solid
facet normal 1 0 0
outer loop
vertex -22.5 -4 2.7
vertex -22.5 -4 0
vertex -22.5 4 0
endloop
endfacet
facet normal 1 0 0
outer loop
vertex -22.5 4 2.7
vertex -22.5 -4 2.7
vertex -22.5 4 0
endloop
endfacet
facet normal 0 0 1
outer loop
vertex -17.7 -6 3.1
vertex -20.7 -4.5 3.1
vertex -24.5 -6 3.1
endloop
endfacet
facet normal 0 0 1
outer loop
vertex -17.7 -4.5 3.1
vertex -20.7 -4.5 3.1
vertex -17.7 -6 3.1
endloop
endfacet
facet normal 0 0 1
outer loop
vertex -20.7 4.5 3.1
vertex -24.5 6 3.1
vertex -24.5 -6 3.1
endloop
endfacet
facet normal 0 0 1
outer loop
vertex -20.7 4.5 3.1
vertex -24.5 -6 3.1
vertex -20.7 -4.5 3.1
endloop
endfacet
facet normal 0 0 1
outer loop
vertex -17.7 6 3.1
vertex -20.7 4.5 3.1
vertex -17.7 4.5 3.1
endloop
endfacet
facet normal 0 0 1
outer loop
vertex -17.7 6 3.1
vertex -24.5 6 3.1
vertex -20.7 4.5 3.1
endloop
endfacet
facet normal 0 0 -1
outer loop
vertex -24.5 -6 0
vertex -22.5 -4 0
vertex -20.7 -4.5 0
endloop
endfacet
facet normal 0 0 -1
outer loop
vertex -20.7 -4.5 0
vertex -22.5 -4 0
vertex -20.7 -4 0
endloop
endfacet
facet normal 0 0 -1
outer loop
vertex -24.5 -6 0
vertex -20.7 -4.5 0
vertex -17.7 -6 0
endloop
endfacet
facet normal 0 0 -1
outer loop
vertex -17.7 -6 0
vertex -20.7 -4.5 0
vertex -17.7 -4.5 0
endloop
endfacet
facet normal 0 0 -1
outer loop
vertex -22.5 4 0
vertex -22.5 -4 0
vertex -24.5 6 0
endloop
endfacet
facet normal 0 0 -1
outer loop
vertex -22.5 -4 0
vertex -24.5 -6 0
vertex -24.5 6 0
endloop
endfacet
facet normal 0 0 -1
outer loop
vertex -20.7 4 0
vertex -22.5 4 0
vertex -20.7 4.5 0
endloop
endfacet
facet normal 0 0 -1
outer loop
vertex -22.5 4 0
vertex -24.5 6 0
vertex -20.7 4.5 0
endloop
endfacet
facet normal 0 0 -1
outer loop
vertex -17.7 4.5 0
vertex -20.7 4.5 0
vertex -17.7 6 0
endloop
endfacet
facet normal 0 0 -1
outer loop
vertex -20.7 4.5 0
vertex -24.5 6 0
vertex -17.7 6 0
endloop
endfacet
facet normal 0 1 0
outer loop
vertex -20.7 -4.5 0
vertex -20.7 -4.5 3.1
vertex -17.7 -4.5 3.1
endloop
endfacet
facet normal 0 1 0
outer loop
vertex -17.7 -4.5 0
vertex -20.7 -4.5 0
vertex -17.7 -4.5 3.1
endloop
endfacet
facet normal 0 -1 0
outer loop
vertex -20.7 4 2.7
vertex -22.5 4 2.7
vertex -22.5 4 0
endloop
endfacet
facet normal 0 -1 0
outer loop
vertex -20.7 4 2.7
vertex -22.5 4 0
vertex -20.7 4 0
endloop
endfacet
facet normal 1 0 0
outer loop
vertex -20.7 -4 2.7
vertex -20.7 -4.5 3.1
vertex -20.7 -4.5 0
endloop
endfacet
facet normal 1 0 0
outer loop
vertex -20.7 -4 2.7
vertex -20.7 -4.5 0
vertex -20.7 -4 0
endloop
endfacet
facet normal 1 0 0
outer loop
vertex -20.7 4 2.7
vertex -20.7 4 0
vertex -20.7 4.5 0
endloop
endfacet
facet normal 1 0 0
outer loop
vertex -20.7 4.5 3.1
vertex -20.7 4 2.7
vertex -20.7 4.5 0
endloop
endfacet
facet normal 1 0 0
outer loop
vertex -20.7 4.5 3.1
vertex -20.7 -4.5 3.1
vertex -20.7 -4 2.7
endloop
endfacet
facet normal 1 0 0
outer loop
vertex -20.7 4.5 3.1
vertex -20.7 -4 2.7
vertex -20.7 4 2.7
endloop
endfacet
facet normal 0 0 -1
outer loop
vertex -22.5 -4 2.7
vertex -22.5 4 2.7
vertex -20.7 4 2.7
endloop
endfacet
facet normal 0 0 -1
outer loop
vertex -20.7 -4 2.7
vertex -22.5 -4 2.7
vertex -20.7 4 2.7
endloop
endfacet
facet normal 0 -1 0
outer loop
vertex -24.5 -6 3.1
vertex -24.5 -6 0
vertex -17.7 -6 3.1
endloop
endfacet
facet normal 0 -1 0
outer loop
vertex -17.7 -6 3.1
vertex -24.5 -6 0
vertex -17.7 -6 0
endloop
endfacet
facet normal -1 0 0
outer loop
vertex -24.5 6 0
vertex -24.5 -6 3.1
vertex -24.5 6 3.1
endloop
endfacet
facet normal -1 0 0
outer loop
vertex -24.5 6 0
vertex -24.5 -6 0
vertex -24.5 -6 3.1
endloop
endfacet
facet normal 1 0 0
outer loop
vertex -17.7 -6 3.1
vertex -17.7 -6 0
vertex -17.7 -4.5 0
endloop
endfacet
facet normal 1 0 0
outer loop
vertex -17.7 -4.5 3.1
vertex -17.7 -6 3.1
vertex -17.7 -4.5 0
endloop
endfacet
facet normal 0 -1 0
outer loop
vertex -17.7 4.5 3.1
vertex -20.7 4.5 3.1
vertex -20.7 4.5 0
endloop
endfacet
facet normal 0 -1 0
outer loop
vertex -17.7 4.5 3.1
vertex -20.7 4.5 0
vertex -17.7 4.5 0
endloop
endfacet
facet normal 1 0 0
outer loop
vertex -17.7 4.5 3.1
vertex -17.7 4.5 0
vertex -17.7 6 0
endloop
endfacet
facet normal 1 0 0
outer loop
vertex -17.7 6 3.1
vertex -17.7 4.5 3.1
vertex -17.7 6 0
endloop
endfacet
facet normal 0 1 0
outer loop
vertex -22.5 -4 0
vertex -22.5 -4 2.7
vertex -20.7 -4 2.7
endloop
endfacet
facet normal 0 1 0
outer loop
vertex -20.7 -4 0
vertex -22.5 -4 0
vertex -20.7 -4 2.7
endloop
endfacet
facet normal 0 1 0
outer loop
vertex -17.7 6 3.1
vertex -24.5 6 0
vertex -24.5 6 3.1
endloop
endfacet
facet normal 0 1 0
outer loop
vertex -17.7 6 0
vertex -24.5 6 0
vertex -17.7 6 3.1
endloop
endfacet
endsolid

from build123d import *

# Parameters (mm, degrees)
SKETCH1_W           = 6.8
SKETCH1_H           = 12
SKETCH1_W_2         = 2.8
SKETCH1_H_2         = 8
BOSS_EXTRUDE2_DEPTH = 2.7
SKETCH2_W           = 6.8
SKETCH2_H           = 12
BOSS_EXTRUDE3_DEPTH = 0.4
SKETCH3_W           = 3
SKETCH3_H           = 9
CUT_EXTRUDE1_DEPTH  = 26.413775792


with BuildPart() as part:
    # Sketch1 → Boss-Extrude2 (new body)
    with BuildSketch(Plane.XY):
        with Locations((-21.1, 0)):
            Rectangle(SKETCH1_W, SKETCH1_H)
        with Locations((-21.1, 0)):
            Rectangle(SKETCH1_W_2, SKETCH1_H_2, mode=Mode.SUBTRACT)
    extrude(amount=BOSS_EXTRUDE2_DEPTH)

    # Sketch2 → Boss-Extrude3 (add)
    with BuildSketch(Plane.XY.offset(2.7)):
        with Locations((-21.1, 0)):
            Rectangle(SKETCH2_W, SKETCH2_H)
    extrude(amount=BOSS_EXTRUDE3_DEPTH)

    # Sketch3 → Cut-Extrude1 (cut, through all)
    with BuildSketch(Plane.XY.offset(3.1)):
        with Locations((-19.2, 0)):
            Rectangle(SKETCH3_W, SKETCH3_H)
    extrude(amount=-CUT_EXTRUDE1_DEPTH, mode=Mode.SUBTRACT)


solid = part.part
